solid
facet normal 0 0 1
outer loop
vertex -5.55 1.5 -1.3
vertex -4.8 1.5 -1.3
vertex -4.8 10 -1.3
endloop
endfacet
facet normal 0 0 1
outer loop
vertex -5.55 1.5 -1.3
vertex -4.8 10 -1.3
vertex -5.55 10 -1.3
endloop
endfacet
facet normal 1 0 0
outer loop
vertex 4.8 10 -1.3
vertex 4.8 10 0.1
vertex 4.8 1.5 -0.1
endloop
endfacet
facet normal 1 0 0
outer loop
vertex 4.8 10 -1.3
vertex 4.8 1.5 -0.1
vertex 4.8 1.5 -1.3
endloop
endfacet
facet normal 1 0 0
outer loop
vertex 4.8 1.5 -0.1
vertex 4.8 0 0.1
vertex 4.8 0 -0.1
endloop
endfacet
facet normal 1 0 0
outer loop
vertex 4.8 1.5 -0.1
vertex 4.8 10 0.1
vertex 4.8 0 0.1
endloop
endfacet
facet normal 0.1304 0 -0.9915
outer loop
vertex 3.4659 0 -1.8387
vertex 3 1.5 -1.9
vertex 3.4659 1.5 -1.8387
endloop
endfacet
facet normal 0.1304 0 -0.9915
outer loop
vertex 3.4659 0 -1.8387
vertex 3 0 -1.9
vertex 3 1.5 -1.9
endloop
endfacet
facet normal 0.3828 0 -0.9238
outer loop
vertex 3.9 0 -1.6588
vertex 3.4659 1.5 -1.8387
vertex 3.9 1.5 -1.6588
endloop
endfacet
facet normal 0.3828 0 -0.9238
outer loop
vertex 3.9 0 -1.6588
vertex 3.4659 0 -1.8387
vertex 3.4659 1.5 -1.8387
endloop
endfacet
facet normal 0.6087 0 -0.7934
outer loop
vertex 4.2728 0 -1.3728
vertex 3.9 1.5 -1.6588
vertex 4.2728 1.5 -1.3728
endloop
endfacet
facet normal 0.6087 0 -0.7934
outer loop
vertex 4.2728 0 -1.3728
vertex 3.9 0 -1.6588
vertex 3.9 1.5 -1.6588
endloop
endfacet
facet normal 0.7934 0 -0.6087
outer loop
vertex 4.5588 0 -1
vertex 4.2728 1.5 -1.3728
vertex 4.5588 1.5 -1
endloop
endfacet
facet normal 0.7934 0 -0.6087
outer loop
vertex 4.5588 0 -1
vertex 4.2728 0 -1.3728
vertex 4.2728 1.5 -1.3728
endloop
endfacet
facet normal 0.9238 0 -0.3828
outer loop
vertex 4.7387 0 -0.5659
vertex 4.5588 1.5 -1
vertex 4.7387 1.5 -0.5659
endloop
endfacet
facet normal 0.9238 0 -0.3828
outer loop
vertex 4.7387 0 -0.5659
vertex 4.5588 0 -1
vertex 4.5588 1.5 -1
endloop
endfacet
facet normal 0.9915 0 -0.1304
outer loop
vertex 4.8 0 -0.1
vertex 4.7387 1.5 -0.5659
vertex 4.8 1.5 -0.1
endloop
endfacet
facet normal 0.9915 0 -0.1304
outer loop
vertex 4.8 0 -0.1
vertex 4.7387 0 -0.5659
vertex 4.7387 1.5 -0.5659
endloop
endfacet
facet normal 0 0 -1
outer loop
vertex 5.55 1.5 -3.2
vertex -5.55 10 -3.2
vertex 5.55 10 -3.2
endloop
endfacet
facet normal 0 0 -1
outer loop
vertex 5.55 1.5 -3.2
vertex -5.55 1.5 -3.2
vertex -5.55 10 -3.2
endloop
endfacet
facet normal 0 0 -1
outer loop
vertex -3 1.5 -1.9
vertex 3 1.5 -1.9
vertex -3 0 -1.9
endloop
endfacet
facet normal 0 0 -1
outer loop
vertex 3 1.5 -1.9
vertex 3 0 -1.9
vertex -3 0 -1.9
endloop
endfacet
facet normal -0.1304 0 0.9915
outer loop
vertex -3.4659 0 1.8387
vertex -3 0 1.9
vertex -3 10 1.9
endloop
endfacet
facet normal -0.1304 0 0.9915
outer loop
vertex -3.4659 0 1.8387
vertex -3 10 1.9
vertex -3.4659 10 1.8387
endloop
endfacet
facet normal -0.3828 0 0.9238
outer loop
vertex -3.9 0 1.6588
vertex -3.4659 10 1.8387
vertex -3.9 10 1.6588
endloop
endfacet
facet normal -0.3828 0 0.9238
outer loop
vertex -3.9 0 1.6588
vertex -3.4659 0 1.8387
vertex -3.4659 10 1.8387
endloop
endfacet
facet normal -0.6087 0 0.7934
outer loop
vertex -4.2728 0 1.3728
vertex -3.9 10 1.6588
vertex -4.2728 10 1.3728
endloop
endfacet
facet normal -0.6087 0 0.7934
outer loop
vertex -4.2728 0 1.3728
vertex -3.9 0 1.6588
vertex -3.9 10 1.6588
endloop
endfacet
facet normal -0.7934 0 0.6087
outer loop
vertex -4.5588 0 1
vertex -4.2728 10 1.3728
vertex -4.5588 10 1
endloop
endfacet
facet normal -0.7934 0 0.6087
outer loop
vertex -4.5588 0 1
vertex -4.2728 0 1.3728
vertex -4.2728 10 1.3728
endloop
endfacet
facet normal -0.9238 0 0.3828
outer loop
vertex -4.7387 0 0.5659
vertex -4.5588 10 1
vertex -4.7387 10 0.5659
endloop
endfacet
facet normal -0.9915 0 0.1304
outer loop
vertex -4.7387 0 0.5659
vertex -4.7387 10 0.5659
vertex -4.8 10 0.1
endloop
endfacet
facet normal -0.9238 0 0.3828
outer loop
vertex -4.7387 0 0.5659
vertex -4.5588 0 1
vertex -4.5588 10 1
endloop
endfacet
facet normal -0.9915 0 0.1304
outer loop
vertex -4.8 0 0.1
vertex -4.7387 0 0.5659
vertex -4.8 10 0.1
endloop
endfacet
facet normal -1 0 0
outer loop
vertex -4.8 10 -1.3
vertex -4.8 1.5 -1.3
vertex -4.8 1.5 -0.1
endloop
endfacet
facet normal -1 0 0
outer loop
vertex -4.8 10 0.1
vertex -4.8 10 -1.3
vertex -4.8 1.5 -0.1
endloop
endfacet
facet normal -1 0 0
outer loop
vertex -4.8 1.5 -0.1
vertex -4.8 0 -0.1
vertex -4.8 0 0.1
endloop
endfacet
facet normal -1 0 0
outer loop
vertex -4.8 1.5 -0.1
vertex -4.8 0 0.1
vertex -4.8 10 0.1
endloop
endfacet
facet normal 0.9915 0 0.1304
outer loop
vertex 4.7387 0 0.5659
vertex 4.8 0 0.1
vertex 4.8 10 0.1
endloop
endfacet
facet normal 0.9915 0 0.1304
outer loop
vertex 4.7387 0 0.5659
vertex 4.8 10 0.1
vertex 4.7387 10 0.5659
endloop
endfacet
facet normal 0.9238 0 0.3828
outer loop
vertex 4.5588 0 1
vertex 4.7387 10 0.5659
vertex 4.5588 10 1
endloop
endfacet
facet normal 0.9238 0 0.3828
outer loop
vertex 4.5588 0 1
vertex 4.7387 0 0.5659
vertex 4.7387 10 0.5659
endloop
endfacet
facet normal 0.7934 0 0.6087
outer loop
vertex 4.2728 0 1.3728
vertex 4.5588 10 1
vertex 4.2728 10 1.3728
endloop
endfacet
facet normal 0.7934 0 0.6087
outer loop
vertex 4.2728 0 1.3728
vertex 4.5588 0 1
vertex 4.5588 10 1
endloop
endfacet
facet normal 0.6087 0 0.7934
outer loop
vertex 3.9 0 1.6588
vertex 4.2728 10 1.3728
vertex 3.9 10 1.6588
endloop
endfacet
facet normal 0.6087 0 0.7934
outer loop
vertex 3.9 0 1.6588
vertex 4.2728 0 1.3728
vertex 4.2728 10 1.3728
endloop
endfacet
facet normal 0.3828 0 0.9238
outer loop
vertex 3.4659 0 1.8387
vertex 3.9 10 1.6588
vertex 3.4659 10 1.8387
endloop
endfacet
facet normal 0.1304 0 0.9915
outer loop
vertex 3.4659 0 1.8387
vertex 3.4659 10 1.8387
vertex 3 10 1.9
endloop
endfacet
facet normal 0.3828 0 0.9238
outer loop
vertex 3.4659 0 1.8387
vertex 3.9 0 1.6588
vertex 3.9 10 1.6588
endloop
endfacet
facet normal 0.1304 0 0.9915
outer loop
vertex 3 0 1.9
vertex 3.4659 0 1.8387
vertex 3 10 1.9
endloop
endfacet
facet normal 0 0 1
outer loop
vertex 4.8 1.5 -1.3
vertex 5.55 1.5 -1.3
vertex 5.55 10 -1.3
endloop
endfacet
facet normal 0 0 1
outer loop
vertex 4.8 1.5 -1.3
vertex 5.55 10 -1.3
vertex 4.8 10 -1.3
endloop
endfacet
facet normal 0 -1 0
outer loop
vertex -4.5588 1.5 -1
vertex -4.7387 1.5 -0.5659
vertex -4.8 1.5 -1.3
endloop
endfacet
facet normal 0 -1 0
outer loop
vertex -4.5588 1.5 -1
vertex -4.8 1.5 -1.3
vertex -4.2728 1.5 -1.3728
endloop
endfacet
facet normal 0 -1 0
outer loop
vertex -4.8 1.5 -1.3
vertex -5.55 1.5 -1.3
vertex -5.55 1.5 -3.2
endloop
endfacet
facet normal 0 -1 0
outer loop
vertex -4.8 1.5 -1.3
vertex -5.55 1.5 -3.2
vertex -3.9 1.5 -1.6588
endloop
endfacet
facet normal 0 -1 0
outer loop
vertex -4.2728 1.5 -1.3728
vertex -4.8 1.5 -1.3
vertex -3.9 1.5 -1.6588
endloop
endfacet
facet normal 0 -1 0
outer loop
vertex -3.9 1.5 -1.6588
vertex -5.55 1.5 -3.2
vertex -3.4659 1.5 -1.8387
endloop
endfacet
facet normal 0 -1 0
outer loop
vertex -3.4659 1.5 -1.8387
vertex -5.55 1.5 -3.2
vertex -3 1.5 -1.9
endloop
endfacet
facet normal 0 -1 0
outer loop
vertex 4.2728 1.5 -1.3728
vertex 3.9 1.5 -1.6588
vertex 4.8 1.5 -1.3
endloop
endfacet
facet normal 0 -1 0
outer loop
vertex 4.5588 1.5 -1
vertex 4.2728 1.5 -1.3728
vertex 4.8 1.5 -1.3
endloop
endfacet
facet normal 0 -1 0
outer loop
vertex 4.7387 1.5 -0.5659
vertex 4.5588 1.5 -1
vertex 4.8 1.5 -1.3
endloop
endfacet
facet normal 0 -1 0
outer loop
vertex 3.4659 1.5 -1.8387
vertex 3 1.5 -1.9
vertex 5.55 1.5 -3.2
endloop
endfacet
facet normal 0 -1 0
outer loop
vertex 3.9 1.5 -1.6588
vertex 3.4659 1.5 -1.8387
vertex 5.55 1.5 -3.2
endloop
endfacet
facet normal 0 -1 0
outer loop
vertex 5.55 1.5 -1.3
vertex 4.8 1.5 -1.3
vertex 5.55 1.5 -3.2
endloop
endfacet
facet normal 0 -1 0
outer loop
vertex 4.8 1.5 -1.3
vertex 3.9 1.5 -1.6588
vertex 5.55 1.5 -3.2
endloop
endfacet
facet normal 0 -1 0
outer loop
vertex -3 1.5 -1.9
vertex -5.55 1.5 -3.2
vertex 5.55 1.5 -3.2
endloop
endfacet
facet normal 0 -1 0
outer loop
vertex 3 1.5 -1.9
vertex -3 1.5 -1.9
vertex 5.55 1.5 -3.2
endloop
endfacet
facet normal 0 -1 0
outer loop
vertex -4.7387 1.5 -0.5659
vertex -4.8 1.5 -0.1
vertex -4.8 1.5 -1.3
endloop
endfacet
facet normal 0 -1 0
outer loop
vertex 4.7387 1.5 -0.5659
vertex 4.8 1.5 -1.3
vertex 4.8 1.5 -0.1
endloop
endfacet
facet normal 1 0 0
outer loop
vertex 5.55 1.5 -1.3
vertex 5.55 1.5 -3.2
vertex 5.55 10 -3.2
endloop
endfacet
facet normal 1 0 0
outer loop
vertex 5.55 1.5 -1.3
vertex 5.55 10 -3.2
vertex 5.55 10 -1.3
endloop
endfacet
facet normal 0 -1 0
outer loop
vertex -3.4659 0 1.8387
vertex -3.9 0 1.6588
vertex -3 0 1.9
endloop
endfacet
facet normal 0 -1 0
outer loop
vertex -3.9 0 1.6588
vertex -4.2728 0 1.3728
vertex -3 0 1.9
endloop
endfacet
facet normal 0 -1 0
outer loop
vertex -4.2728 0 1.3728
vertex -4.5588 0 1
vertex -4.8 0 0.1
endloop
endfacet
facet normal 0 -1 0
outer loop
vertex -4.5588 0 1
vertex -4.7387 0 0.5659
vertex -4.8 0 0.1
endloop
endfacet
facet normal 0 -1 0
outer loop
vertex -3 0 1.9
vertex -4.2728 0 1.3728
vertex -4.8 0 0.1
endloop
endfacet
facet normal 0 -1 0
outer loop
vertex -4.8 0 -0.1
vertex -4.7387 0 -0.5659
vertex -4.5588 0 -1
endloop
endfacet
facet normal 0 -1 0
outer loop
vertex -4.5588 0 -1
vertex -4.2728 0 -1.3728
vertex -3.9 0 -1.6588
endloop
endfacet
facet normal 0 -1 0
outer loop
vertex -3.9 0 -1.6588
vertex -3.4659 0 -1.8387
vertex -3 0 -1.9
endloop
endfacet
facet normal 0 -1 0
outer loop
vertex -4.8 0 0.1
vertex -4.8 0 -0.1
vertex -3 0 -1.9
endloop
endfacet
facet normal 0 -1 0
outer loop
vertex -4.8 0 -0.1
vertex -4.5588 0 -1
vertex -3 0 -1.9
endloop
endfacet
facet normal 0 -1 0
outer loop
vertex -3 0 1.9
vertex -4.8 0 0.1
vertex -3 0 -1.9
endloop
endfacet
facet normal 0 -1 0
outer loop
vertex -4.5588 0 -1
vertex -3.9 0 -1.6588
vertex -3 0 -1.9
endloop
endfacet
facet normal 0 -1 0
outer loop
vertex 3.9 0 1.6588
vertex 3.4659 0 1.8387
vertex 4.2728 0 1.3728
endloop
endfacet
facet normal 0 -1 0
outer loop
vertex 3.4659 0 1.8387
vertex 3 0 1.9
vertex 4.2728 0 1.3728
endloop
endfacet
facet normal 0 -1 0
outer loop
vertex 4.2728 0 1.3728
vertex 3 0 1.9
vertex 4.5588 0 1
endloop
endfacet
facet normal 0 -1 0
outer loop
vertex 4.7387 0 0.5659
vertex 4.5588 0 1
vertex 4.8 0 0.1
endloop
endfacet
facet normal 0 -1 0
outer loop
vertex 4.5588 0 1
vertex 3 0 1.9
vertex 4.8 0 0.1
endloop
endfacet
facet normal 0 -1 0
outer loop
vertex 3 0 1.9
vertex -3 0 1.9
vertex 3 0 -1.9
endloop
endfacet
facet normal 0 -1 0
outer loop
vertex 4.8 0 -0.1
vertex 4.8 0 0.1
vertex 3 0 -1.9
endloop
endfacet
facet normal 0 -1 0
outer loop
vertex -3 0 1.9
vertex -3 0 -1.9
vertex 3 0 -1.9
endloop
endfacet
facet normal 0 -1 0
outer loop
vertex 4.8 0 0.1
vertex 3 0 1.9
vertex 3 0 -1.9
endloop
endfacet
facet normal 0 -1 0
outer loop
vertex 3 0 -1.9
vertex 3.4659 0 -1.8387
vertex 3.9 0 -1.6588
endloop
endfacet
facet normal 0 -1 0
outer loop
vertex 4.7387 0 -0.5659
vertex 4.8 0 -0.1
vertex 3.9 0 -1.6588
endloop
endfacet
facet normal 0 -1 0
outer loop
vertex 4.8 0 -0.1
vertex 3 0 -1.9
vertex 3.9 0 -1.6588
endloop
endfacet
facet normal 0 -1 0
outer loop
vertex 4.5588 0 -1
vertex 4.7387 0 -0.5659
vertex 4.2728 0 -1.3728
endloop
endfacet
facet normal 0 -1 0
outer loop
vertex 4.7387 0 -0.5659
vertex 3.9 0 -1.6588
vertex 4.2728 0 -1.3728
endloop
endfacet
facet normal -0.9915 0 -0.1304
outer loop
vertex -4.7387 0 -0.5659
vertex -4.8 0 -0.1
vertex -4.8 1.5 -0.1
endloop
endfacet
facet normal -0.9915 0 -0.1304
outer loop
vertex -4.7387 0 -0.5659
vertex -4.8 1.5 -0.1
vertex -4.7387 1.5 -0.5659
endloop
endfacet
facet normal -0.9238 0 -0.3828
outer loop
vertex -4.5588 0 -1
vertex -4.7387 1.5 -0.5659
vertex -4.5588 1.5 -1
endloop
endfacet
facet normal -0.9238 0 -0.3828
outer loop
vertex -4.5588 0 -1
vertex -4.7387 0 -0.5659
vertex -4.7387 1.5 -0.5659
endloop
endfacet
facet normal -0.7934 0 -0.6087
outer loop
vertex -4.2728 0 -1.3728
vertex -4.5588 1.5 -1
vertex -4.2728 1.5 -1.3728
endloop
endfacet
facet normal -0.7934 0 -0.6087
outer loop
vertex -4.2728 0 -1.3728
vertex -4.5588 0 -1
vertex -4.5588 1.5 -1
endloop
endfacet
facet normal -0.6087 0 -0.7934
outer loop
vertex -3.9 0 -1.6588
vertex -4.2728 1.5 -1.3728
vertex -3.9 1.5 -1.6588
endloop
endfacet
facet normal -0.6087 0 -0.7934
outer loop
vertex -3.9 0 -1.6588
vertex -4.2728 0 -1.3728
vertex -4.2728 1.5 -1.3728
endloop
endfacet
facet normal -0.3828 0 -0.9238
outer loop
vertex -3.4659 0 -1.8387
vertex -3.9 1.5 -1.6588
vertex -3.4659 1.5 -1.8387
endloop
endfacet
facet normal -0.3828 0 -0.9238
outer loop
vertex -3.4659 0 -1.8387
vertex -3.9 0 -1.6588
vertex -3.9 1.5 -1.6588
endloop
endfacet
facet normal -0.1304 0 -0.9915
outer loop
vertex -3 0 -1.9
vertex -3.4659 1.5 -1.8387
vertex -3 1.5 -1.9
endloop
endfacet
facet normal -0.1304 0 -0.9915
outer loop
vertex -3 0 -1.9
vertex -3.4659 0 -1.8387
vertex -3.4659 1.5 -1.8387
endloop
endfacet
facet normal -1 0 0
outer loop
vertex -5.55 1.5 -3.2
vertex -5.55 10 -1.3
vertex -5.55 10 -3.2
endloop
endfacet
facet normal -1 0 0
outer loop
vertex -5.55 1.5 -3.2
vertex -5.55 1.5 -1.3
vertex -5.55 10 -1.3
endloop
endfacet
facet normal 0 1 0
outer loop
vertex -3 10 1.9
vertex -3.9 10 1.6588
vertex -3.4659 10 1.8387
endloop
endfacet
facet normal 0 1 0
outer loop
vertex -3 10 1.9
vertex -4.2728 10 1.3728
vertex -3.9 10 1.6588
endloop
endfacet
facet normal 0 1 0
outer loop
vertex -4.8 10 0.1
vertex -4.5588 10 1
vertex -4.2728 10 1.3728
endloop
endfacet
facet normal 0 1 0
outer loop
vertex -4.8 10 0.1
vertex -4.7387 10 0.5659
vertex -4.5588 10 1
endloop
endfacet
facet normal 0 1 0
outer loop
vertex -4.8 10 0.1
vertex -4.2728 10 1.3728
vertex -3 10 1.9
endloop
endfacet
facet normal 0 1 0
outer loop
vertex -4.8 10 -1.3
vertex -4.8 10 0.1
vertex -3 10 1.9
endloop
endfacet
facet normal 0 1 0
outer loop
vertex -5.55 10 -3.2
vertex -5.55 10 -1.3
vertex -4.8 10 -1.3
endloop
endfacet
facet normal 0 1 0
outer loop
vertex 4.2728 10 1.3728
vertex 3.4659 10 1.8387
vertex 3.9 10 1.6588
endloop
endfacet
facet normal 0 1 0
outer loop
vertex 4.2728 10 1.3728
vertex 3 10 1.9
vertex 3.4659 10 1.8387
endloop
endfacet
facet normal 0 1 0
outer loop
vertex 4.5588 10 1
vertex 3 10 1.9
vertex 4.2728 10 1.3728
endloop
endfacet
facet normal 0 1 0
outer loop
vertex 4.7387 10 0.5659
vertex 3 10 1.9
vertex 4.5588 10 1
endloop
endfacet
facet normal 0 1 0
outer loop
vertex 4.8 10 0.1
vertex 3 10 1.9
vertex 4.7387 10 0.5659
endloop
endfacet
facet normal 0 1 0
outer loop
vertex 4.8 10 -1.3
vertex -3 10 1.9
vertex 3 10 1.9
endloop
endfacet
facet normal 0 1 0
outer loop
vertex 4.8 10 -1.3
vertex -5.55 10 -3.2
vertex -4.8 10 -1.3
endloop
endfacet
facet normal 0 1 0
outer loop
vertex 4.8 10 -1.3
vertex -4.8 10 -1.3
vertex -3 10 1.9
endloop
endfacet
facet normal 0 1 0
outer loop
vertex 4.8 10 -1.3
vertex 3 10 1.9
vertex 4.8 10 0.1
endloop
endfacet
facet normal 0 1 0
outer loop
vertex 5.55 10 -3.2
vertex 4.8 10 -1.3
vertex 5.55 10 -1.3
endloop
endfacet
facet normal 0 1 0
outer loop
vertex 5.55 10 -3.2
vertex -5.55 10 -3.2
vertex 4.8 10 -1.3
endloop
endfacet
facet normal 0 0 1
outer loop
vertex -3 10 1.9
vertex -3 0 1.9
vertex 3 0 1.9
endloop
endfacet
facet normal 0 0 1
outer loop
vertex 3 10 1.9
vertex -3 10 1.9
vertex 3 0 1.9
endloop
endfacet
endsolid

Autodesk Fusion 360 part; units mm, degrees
sketch "Sketch1" plane through (0, 0, 0) normal (0, 1, 0) x (1, 0, 0)
  line L0 (4.5, 1.6) -> (-4.5, 1.6)
  line L1 (-4.5, 0.1) -> (-4.5, -0.1)
  line L2 (-3, -1.6) -> (3, -1.6)
  line L3 (4.5, -0.1) -> (4.5, 0.1)
  line L4 (4.5, 1.6) -> (-4.5, -1.6) construction
  line L5 (-4.5, 1.6) -> (4.5, -1.6) construction
  arc A0 (-4.5, -0.1) -> (-3, -1.6) centre (-3, -0.1) ccw
  arc A1 (3, -1.6) -> (4.5, -0.1) centre (3, -0.1) ccw
  line L6 (3, 1.6) -> (-3, 1.6)
  arc A2 (-3, 1.6) -> (-4.5, 0.1) centre (-3, 0.1) ccw
  arc A3 (4.5, 0.1) -> (3, 1.6) centre (3, 0.1) ccw
  line L7 (4.5, 1.6) -> (4.5, 0)
  line L8 (-4.5, 1.6) -> (-4.5, 0)
  line L9 (-5.25, 3.2) -> (5.25, 3.2)
  line L10 (5.25, 3.2) -> (5.25, 1.6)
  line L11 (5.25, 1.6) -> (-5.25, 1.6)
  line L12 (-5.25, 1.6) -> (-5.25, 3.2)
  point P0 (0, 1.6)
  point P1 (0, 1.6)
  dimension "d5" = 9
  dimension "d6" = 3.2
  dimension "d8" = 1.5
  dimension "d11" = 1.5
  dimension "d12" = 10.5
  dimension "d13" = 1.6
extrude "Extrude1" add sketch "Sketch1" along normal blind 10 contours L0 L1 L2 L3 A0 A1 L6 A2 A3 L7 L8 L11
extrude "Extrude2" add sketch "Sketch1" along normal blind 8.5 from surface at 1.5 contours L0 A3 L7 L11 | L0 L6 L9 L10 L11 L12 | L0 A2 L8 L11
move_face "OffsetFaces1" offset 0.3 12 faces at (4.4983, 6.6667, 0.1714) (-1, 3.3333, 1.6) (-3.0714, 6.6667, 1.5983) (-4.5, 7.1667, -0.5333) (-4.75, 4.3333, -1.6) (-5.25, 4.3333, -2.1333) (4.5, 7.1667, -0.5333) (3.0714, 1, -1.5983) (1, 0.5, -1.6) (-4.3926, 1, -0.6575) (5, 4.3333, -1.6) (5.25, 4.3333, -2.6667)
equation "usb_c_width = 9 mm"
equation "usb_c_height = 3.2 mm"
equation "pcb_thickness = 1.6 mm"
equation "pcb_width = 10.5 mm"
equation "d5 = usb_c_width"
equation "d6 = usb_c_height"
equation "usb_c_fillet = 1.5 mm"
equation "d8 = usb_c_fillet"
equation "d11 = usb_c_fillet"
equation "d12 = pcb_width"
equation "d13 = pcb_thickness"
